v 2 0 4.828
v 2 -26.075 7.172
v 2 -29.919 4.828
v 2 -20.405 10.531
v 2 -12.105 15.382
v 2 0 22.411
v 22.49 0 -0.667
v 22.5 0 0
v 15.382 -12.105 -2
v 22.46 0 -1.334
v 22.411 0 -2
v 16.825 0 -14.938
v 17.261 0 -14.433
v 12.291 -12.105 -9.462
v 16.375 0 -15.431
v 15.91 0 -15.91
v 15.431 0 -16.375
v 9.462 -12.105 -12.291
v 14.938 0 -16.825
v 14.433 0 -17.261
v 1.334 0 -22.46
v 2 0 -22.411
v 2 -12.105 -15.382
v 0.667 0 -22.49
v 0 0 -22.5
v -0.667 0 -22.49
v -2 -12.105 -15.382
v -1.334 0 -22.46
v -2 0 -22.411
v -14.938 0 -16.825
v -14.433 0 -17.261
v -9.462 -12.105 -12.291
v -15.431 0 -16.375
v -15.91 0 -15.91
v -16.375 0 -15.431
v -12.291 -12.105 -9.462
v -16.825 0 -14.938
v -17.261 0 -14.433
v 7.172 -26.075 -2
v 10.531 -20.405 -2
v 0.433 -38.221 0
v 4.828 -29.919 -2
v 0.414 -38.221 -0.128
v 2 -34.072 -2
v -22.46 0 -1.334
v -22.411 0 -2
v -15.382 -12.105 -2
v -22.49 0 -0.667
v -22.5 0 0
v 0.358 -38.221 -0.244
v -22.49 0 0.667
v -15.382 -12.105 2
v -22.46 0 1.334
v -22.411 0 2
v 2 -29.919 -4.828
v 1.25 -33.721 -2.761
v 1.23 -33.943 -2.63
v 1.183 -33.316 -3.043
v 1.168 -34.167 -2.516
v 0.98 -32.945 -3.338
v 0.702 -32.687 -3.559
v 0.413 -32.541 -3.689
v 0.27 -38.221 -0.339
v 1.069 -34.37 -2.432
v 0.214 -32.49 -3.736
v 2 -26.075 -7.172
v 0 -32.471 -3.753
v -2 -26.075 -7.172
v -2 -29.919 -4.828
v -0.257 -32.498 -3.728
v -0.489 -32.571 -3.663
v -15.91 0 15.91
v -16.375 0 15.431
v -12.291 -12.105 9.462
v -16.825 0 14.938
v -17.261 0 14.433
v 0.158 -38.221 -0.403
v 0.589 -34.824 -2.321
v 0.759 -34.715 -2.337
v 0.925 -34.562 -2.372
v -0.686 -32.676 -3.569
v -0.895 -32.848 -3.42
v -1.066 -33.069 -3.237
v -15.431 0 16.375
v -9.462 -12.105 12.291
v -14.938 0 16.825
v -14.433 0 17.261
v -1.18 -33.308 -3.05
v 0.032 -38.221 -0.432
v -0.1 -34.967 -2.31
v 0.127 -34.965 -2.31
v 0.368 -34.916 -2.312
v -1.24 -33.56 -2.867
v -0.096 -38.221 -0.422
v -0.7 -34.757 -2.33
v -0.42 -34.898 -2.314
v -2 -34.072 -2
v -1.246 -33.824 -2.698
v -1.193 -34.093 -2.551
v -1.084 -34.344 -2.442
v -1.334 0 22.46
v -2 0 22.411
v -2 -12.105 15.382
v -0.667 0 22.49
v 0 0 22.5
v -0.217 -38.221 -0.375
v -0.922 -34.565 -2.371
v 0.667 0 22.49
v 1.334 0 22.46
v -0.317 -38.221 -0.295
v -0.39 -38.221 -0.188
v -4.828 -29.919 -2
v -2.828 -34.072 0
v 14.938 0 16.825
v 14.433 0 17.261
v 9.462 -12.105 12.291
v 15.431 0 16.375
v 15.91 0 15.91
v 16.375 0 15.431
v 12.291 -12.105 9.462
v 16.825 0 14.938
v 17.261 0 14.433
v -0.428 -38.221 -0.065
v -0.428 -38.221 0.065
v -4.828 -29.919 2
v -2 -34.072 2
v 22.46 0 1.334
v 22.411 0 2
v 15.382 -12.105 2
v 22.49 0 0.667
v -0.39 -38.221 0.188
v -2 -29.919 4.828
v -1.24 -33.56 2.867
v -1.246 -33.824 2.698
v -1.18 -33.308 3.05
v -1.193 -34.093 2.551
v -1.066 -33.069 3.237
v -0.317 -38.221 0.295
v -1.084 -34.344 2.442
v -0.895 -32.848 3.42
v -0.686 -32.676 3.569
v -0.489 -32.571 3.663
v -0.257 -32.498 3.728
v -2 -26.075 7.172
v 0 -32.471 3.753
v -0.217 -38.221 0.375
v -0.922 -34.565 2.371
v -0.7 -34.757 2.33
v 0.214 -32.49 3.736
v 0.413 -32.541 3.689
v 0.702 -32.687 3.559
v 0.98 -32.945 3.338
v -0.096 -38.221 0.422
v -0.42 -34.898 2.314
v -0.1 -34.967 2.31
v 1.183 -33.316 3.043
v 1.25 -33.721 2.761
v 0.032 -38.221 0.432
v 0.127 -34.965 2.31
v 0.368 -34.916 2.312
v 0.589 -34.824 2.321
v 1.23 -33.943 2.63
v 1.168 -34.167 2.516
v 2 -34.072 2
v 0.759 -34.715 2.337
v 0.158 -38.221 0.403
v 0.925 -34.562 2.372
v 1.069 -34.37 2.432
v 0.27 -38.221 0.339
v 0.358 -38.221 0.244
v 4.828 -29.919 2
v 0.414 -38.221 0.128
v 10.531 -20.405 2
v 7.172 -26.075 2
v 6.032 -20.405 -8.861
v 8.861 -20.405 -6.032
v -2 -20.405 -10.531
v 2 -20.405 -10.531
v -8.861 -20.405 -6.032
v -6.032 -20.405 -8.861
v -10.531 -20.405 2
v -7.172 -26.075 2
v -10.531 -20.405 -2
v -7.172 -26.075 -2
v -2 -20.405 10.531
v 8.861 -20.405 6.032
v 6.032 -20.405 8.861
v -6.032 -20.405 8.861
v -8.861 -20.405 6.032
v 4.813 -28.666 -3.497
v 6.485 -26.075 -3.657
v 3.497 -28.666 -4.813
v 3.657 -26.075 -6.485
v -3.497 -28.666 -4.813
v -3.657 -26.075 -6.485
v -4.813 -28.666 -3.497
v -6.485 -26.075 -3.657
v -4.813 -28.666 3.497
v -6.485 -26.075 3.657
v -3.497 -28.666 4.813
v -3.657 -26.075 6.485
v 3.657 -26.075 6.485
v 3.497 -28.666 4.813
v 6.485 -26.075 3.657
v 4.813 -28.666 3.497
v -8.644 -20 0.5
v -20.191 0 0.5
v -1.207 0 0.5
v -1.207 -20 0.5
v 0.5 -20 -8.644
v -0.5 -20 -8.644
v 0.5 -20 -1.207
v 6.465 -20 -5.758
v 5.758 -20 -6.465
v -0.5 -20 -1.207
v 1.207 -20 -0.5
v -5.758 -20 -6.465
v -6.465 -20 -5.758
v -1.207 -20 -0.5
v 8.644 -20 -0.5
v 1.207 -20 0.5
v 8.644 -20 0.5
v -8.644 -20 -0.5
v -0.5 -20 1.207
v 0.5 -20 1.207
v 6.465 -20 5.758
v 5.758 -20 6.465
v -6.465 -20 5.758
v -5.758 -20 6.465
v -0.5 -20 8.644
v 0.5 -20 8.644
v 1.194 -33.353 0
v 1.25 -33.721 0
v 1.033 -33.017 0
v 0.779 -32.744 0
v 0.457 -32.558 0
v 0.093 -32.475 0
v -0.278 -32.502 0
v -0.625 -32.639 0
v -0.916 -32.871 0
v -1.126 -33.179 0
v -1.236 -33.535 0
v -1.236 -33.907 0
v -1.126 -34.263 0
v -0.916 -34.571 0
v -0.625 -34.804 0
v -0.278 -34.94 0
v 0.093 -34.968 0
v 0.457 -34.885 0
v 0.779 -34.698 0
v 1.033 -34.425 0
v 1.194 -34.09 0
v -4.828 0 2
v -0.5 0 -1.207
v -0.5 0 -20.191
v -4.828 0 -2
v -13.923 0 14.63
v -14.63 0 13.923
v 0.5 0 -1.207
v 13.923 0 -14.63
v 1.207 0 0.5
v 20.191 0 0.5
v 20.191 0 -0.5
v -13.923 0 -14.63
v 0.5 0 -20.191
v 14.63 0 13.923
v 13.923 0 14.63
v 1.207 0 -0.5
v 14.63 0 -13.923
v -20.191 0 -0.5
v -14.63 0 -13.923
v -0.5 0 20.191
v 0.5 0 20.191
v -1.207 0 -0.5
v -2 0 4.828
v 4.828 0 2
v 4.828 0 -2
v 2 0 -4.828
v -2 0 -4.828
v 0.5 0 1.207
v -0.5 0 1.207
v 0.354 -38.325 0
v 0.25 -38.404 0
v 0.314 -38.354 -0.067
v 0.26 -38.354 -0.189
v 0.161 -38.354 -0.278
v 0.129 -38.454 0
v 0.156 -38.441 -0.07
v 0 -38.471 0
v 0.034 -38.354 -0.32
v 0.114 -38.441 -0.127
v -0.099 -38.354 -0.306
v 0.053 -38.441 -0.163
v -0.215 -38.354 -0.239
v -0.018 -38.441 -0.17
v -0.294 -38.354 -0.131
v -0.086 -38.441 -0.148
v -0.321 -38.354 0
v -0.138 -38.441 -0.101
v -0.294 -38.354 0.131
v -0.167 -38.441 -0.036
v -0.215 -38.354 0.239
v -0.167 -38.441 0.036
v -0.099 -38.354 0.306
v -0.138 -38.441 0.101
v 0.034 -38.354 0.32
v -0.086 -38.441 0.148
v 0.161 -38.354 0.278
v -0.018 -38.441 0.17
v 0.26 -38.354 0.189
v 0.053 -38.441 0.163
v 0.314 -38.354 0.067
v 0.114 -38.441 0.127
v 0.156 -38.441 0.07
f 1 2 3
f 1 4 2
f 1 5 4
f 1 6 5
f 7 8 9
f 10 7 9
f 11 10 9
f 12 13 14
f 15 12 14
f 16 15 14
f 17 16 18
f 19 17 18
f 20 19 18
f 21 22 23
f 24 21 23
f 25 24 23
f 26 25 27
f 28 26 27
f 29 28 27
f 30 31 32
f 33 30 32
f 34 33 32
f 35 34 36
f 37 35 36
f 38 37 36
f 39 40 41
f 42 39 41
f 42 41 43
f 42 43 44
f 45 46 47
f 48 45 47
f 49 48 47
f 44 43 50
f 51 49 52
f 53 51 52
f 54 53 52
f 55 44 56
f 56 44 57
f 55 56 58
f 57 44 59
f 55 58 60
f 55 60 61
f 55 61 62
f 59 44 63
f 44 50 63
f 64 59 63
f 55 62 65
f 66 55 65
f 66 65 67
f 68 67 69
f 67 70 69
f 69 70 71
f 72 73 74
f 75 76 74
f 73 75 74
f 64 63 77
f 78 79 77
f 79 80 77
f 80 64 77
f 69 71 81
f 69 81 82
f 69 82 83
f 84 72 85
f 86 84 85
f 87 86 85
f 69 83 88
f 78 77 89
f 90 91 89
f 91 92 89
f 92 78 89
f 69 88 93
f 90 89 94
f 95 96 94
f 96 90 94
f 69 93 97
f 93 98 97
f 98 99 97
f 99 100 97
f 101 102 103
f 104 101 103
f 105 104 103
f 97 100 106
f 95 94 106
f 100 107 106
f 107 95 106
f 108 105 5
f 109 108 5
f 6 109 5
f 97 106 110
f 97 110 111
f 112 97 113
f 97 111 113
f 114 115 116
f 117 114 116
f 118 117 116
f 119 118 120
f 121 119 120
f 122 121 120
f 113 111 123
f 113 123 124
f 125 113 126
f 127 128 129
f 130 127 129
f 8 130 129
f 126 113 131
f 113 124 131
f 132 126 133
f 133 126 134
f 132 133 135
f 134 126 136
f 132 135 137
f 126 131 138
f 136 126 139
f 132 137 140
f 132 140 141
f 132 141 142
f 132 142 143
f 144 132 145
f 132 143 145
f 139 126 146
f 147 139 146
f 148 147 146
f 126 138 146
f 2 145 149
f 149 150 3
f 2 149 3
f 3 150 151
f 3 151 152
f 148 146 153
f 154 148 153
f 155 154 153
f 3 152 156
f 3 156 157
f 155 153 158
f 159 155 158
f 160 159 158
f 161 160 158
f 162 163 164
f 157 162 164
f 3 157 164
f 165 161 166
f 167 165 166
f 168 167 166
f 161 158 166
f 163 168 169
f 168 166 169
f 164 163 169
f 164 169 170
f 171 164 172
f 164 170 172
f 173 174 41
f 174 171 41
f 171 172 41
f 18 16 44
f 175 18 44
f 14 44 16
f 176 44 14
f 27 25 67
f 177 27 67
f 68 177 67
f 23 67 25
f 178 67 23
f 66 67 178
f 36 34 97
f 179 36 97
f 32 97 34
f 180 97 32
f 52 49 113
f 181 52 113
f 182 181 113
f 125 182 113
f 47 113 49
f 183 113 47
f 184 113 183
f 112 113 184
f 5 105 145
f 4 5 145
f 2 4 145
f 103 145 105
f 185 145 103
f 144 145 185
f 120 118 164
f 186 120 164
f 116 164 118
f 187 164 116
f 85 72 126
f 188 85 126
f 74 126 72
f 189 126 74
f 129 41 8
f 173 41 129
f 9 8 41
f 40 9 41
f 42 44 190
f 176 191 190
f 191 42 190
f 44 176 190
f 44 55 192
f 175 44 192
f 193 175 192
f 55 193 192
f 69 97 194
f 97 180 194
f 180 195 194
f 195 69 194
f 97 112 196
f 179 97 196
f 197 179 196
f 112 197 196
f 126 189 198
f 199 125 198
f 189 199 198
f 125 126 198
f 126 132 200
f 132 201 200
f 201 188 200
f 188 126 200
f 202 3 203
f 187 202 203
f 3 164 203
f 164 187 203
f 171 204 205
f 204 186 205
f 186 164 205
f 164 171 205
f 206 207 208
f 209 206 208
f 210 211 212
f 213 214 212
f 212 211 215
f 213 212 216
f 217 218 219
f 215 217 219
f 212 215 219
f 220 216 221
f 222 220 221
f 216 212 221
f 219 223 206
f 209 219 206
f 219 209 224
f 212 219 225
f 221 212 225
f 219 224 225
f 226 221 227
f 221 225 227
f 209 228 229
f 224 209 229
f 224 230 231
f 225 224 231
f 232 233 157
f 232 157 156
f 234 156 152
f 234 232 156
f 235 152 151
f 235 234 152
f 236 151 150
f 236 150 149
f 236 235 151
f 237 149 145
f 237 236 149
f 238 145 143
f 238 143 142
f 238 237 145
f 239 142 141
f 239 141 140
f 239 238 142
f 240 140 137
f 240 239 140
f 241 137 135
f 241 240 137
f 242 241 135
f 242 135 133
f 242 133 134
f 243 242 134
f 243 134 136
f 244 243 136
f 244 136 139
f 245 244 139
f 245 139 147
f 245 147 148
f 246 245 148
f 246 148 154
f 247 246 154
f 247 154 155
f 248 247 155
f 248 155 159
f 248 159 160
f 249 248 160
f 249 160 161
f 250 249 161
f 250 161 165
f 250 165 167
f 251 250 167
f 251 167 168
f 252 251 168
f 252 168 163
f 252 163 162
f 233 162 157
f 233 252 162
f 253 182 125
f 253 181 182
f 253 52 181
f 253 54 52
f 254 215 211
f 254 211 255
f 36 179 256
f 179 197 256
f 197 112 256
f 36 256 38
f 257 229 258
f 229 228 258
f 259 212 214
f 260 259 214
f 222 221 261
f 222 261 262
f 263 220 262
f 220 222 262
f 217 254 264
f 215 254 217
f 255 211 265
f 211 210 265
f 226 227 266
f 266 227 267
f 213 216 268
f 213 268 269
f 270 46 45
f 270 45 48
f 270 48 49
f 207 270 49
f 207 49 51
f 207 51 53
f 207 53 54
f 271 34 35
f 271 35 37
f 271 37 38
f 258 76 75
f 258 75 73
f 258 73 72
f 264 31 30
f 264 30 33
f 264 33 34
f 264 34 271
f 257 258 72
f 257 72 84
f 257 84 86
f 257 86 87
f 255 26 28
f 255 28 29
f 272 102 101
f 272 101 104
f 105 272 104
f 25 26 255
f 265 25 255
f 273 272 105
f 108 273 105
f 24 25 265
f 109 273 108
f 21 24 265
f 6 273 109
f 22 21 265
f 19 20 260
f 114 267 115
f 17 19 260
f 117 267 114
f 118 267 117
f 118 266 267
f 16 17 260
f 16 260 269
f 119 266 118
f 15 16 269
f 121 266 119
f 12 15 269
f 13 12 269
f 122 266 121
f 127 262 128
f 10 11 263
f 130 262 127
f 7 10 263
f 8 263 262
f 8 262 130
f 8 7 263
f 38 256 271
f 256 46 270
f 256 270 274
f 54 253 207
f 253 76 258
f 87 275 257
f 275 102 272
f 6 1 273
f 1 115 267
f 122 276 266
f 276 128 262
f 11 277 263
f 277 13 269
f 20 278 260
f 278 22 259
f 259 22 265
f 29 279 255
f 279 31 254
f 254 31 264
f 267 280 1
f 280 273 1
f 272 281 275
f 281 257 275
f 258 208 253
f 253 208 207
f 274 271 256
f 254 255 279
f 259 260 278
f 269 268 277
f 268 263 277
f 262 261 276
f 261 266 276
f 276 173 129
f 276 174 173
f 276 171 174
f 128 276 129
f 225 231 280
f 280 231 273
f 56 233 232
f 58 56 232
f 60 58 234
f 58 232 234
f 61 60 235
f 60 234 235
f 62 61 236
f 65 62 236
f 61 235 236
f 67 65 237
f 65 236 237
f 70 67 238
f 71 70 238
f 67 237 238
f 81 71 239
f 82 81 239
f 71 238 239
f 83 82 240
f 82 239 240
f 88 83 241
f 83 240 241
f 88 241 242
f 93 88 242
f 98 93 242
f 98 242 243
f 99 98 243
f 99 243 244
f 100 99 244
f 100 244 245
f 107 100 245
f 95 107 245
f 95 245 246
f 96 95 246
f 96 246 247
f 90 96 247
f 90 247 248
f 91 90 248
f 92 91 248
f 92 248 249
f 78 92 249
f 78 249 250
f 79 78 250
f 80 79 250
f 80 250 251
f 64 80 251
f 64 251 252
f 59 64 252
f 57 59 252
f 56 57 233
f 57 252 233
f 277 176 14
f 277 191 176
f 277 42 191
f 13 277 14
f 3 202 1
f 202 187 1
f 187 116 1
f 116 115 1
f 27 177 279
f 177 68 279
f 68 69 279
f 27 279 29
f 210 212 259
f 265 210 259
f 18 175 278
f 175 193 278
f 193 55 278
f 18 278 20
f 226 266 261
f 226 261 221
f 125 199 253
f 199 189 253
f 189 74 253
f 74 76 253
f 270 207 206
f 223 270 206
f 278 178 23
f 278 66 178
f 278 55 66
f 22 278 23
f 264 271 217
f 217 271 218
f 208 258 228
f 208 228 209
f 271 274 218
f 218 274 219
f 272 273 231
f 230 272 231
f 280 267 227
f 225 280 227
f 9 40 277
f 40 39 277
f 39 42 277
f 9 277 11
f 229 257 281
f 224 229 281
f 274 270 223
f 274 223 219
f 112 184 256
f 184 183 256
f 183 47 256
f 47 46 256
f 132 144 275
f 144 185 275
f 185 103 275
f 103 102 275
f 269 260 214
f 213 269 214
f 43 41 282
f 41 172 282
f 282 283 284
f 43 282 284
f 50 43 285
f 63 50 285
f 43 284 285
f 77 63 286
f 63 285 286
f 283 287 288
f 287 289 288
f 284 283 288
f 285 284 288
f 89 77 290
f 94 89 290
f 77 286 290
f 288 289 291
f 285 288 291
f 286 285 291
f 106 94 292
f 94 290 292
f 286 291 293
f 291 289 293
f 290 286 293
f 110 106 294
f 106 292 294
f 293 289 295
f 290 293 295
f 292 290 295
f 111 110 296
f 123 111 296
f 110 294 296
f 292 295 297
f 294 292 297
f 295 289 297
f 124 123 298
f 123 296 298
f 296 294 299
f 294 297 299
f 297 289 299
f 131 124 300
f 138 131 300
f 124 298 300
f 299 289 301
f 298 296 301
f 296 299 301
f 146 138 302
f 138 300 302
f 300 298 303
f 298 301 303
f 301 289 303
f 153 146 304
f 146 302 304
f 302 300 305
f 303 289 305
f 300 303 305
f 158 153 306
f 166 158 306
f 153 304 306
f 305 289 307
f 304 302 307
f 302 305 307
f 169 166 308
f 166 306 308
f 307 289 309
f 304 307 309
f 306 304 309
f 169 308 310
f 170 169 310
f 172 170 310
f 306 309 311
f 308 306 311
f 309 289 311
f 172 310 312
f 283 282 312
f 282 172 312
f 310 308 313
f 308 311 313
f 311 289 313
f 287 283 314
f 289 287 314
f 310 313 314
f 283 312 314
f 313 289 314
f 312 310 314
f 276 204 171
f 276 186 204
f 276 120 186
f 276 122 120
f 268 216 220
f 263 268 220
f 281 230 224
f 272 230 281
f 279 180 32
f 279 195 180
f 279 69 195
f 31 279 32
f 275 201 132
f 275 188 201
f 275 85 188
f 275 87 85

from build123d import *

# Parameters (mm, degrees)
F2_DEPTH       = 2
F2_DEPTH_BACK  = 2
F3_ANGLE       = 45
F4_ANGLE       = 45
F5_ANGLE       = 45
F10_DEPTH      = 0.5
F12_DEPTH      = 0.5
F15_DEPTH      = 0.5
F18_DEPTH      = 0.5
F19_R          = 1.25
F20_DEPTH      = 22.501
F20_DEPTH_BACK = 22.501


with BuildPart() as f2:
    # F1 (on Top) → F2 (new body, two sides)
    with BuildSketch(Plane.XY) as f2_sk:
        Polygon((22.5, 0), (-22.5, 0), (0, -38.9711431703), align=None)
    extrude(amount=F2_DEPTH)
    extrude(f2_sk.sketch, amount=-F2_DEPTH_BACK)


with BuildPart() as f3_1:
    # F3: copy of F2
    add(f2.part.rotate(Axis((0, -18.774760887, 0), (0, 1, 0)), F3_ANGLE))


with BuildPart() as f4_1:
    # F4: copy of F3_1
    add(f3_1.part.rotate(Axis((0, -18.774760887, 0), (0, 1, 0)), F4_ANGLE))


with BuildPart() as f5_1:
    # F5: copy of F4_1
    add(f4_1.part.rotate(Axis((0, -18.774760887, 0), (0, 1, 0)), F5_ANGLE))


with BuildPart() as f2_1:
    add(f2.part)

    # F6: union F3_1, F4_1, F5_1
    add(f3_1.part)
    add(f4_1.part)
    add(f5_1.part)

    # F9 (on line) → F10 (cut, symmetric)
    with BuildSketch(Plane(origin=(0, 0, 0), x_dir=(0, -1, 0), z_dir=(-0.7071067812, 0, 0.7071067812))):
        Polygon((0, -20.1905989232), (20, -8.6435935394), (20, 8.6435935394), (0, 20.1905989232), align=None)
    extrude(amount=F10_DEPTH, both=True, mode=Mode.SUBTRACT)

    # F11 (on Right) → F12 (cut, symmetric)
    with BuildSketch(Plane.YZ):
        Polygon((-20, -8.6435935394), (0, -20.1905989232), (0, 20.1905989232), (-20, 8.6435935394), align=None)
    extrude(amount=F12_DEPTH, both=True, mode=Mode.SUBTRACT)

    # F14 (on Top) → F15 (cut, symmetric)
    with BuildSketch(Plane.XY):
        Polygon((20.1905989232, 0), (-20.1905989232, 0), (-8.6435935394, -20), (8.6435935394, -20), align=None)
    extrude(amount=F15_DEPTH, both=True, mode=Mode.SUBTRACT)

    # F16 (on Top) → F17 (revolve, cut)
    with BuildSketch(Plane.XY):
        with BuildLine():
            Line((47.749247402, 0), (22.5, 0))
            Line((22.5, 0), (0.4330127019, -38.2211431703))
            ThreePointArc((0.4330127019, -38.2211431703), (0.25, -38.4041558722), (0, -38.4711431703))
            Line((0, -38.4711431703), (0, -38.9711431703))
            Line((0, -38.9711431703), (0, -40.9711431703))
            Line((0, -40.9711431703), (49.3083149195, -40.9711431703))
            Line((49.3083149195, -40.9711431703), (47.749247402, 0))
        make_face()
    revolve(axis=Axis((0, -18.774760887, 0), (0, 1, 0)), mode=Mode.SUBTRACT)

    # F13 (on line) → F18 (cut, symmetric)
    with BuildSketch(Plane(origin=(0, 0, 0), x_dir=(0.7071067812, 0, -0.7071067812), z_dir=(-0.7071067812, 0, -0.7071067812))):
        Polygon((-20.1905989232, 0), (20.1905989232, 0), (8.6435935394, 20), (-8.6435935394, 20), align=None)
    extrude(amount=F18_DEPTH, both=True, mode=Mode.SUBTRACT)

    # F19 (on Top) → F20 (cut, two sides)
    with BuildSketch(Plane.XY) as f20_sk:
        with Locations((0, -33.7211431703)):
            Circle(F19_R)
    extrude(amount=-F20_DEPTH, mode=Mode.SUBTRACT)
    extrude(f20_sk.sketch, amount=F20_DEPTH_BACK, mode=Mode.SUBTRACT)


solid = f2_1.part
